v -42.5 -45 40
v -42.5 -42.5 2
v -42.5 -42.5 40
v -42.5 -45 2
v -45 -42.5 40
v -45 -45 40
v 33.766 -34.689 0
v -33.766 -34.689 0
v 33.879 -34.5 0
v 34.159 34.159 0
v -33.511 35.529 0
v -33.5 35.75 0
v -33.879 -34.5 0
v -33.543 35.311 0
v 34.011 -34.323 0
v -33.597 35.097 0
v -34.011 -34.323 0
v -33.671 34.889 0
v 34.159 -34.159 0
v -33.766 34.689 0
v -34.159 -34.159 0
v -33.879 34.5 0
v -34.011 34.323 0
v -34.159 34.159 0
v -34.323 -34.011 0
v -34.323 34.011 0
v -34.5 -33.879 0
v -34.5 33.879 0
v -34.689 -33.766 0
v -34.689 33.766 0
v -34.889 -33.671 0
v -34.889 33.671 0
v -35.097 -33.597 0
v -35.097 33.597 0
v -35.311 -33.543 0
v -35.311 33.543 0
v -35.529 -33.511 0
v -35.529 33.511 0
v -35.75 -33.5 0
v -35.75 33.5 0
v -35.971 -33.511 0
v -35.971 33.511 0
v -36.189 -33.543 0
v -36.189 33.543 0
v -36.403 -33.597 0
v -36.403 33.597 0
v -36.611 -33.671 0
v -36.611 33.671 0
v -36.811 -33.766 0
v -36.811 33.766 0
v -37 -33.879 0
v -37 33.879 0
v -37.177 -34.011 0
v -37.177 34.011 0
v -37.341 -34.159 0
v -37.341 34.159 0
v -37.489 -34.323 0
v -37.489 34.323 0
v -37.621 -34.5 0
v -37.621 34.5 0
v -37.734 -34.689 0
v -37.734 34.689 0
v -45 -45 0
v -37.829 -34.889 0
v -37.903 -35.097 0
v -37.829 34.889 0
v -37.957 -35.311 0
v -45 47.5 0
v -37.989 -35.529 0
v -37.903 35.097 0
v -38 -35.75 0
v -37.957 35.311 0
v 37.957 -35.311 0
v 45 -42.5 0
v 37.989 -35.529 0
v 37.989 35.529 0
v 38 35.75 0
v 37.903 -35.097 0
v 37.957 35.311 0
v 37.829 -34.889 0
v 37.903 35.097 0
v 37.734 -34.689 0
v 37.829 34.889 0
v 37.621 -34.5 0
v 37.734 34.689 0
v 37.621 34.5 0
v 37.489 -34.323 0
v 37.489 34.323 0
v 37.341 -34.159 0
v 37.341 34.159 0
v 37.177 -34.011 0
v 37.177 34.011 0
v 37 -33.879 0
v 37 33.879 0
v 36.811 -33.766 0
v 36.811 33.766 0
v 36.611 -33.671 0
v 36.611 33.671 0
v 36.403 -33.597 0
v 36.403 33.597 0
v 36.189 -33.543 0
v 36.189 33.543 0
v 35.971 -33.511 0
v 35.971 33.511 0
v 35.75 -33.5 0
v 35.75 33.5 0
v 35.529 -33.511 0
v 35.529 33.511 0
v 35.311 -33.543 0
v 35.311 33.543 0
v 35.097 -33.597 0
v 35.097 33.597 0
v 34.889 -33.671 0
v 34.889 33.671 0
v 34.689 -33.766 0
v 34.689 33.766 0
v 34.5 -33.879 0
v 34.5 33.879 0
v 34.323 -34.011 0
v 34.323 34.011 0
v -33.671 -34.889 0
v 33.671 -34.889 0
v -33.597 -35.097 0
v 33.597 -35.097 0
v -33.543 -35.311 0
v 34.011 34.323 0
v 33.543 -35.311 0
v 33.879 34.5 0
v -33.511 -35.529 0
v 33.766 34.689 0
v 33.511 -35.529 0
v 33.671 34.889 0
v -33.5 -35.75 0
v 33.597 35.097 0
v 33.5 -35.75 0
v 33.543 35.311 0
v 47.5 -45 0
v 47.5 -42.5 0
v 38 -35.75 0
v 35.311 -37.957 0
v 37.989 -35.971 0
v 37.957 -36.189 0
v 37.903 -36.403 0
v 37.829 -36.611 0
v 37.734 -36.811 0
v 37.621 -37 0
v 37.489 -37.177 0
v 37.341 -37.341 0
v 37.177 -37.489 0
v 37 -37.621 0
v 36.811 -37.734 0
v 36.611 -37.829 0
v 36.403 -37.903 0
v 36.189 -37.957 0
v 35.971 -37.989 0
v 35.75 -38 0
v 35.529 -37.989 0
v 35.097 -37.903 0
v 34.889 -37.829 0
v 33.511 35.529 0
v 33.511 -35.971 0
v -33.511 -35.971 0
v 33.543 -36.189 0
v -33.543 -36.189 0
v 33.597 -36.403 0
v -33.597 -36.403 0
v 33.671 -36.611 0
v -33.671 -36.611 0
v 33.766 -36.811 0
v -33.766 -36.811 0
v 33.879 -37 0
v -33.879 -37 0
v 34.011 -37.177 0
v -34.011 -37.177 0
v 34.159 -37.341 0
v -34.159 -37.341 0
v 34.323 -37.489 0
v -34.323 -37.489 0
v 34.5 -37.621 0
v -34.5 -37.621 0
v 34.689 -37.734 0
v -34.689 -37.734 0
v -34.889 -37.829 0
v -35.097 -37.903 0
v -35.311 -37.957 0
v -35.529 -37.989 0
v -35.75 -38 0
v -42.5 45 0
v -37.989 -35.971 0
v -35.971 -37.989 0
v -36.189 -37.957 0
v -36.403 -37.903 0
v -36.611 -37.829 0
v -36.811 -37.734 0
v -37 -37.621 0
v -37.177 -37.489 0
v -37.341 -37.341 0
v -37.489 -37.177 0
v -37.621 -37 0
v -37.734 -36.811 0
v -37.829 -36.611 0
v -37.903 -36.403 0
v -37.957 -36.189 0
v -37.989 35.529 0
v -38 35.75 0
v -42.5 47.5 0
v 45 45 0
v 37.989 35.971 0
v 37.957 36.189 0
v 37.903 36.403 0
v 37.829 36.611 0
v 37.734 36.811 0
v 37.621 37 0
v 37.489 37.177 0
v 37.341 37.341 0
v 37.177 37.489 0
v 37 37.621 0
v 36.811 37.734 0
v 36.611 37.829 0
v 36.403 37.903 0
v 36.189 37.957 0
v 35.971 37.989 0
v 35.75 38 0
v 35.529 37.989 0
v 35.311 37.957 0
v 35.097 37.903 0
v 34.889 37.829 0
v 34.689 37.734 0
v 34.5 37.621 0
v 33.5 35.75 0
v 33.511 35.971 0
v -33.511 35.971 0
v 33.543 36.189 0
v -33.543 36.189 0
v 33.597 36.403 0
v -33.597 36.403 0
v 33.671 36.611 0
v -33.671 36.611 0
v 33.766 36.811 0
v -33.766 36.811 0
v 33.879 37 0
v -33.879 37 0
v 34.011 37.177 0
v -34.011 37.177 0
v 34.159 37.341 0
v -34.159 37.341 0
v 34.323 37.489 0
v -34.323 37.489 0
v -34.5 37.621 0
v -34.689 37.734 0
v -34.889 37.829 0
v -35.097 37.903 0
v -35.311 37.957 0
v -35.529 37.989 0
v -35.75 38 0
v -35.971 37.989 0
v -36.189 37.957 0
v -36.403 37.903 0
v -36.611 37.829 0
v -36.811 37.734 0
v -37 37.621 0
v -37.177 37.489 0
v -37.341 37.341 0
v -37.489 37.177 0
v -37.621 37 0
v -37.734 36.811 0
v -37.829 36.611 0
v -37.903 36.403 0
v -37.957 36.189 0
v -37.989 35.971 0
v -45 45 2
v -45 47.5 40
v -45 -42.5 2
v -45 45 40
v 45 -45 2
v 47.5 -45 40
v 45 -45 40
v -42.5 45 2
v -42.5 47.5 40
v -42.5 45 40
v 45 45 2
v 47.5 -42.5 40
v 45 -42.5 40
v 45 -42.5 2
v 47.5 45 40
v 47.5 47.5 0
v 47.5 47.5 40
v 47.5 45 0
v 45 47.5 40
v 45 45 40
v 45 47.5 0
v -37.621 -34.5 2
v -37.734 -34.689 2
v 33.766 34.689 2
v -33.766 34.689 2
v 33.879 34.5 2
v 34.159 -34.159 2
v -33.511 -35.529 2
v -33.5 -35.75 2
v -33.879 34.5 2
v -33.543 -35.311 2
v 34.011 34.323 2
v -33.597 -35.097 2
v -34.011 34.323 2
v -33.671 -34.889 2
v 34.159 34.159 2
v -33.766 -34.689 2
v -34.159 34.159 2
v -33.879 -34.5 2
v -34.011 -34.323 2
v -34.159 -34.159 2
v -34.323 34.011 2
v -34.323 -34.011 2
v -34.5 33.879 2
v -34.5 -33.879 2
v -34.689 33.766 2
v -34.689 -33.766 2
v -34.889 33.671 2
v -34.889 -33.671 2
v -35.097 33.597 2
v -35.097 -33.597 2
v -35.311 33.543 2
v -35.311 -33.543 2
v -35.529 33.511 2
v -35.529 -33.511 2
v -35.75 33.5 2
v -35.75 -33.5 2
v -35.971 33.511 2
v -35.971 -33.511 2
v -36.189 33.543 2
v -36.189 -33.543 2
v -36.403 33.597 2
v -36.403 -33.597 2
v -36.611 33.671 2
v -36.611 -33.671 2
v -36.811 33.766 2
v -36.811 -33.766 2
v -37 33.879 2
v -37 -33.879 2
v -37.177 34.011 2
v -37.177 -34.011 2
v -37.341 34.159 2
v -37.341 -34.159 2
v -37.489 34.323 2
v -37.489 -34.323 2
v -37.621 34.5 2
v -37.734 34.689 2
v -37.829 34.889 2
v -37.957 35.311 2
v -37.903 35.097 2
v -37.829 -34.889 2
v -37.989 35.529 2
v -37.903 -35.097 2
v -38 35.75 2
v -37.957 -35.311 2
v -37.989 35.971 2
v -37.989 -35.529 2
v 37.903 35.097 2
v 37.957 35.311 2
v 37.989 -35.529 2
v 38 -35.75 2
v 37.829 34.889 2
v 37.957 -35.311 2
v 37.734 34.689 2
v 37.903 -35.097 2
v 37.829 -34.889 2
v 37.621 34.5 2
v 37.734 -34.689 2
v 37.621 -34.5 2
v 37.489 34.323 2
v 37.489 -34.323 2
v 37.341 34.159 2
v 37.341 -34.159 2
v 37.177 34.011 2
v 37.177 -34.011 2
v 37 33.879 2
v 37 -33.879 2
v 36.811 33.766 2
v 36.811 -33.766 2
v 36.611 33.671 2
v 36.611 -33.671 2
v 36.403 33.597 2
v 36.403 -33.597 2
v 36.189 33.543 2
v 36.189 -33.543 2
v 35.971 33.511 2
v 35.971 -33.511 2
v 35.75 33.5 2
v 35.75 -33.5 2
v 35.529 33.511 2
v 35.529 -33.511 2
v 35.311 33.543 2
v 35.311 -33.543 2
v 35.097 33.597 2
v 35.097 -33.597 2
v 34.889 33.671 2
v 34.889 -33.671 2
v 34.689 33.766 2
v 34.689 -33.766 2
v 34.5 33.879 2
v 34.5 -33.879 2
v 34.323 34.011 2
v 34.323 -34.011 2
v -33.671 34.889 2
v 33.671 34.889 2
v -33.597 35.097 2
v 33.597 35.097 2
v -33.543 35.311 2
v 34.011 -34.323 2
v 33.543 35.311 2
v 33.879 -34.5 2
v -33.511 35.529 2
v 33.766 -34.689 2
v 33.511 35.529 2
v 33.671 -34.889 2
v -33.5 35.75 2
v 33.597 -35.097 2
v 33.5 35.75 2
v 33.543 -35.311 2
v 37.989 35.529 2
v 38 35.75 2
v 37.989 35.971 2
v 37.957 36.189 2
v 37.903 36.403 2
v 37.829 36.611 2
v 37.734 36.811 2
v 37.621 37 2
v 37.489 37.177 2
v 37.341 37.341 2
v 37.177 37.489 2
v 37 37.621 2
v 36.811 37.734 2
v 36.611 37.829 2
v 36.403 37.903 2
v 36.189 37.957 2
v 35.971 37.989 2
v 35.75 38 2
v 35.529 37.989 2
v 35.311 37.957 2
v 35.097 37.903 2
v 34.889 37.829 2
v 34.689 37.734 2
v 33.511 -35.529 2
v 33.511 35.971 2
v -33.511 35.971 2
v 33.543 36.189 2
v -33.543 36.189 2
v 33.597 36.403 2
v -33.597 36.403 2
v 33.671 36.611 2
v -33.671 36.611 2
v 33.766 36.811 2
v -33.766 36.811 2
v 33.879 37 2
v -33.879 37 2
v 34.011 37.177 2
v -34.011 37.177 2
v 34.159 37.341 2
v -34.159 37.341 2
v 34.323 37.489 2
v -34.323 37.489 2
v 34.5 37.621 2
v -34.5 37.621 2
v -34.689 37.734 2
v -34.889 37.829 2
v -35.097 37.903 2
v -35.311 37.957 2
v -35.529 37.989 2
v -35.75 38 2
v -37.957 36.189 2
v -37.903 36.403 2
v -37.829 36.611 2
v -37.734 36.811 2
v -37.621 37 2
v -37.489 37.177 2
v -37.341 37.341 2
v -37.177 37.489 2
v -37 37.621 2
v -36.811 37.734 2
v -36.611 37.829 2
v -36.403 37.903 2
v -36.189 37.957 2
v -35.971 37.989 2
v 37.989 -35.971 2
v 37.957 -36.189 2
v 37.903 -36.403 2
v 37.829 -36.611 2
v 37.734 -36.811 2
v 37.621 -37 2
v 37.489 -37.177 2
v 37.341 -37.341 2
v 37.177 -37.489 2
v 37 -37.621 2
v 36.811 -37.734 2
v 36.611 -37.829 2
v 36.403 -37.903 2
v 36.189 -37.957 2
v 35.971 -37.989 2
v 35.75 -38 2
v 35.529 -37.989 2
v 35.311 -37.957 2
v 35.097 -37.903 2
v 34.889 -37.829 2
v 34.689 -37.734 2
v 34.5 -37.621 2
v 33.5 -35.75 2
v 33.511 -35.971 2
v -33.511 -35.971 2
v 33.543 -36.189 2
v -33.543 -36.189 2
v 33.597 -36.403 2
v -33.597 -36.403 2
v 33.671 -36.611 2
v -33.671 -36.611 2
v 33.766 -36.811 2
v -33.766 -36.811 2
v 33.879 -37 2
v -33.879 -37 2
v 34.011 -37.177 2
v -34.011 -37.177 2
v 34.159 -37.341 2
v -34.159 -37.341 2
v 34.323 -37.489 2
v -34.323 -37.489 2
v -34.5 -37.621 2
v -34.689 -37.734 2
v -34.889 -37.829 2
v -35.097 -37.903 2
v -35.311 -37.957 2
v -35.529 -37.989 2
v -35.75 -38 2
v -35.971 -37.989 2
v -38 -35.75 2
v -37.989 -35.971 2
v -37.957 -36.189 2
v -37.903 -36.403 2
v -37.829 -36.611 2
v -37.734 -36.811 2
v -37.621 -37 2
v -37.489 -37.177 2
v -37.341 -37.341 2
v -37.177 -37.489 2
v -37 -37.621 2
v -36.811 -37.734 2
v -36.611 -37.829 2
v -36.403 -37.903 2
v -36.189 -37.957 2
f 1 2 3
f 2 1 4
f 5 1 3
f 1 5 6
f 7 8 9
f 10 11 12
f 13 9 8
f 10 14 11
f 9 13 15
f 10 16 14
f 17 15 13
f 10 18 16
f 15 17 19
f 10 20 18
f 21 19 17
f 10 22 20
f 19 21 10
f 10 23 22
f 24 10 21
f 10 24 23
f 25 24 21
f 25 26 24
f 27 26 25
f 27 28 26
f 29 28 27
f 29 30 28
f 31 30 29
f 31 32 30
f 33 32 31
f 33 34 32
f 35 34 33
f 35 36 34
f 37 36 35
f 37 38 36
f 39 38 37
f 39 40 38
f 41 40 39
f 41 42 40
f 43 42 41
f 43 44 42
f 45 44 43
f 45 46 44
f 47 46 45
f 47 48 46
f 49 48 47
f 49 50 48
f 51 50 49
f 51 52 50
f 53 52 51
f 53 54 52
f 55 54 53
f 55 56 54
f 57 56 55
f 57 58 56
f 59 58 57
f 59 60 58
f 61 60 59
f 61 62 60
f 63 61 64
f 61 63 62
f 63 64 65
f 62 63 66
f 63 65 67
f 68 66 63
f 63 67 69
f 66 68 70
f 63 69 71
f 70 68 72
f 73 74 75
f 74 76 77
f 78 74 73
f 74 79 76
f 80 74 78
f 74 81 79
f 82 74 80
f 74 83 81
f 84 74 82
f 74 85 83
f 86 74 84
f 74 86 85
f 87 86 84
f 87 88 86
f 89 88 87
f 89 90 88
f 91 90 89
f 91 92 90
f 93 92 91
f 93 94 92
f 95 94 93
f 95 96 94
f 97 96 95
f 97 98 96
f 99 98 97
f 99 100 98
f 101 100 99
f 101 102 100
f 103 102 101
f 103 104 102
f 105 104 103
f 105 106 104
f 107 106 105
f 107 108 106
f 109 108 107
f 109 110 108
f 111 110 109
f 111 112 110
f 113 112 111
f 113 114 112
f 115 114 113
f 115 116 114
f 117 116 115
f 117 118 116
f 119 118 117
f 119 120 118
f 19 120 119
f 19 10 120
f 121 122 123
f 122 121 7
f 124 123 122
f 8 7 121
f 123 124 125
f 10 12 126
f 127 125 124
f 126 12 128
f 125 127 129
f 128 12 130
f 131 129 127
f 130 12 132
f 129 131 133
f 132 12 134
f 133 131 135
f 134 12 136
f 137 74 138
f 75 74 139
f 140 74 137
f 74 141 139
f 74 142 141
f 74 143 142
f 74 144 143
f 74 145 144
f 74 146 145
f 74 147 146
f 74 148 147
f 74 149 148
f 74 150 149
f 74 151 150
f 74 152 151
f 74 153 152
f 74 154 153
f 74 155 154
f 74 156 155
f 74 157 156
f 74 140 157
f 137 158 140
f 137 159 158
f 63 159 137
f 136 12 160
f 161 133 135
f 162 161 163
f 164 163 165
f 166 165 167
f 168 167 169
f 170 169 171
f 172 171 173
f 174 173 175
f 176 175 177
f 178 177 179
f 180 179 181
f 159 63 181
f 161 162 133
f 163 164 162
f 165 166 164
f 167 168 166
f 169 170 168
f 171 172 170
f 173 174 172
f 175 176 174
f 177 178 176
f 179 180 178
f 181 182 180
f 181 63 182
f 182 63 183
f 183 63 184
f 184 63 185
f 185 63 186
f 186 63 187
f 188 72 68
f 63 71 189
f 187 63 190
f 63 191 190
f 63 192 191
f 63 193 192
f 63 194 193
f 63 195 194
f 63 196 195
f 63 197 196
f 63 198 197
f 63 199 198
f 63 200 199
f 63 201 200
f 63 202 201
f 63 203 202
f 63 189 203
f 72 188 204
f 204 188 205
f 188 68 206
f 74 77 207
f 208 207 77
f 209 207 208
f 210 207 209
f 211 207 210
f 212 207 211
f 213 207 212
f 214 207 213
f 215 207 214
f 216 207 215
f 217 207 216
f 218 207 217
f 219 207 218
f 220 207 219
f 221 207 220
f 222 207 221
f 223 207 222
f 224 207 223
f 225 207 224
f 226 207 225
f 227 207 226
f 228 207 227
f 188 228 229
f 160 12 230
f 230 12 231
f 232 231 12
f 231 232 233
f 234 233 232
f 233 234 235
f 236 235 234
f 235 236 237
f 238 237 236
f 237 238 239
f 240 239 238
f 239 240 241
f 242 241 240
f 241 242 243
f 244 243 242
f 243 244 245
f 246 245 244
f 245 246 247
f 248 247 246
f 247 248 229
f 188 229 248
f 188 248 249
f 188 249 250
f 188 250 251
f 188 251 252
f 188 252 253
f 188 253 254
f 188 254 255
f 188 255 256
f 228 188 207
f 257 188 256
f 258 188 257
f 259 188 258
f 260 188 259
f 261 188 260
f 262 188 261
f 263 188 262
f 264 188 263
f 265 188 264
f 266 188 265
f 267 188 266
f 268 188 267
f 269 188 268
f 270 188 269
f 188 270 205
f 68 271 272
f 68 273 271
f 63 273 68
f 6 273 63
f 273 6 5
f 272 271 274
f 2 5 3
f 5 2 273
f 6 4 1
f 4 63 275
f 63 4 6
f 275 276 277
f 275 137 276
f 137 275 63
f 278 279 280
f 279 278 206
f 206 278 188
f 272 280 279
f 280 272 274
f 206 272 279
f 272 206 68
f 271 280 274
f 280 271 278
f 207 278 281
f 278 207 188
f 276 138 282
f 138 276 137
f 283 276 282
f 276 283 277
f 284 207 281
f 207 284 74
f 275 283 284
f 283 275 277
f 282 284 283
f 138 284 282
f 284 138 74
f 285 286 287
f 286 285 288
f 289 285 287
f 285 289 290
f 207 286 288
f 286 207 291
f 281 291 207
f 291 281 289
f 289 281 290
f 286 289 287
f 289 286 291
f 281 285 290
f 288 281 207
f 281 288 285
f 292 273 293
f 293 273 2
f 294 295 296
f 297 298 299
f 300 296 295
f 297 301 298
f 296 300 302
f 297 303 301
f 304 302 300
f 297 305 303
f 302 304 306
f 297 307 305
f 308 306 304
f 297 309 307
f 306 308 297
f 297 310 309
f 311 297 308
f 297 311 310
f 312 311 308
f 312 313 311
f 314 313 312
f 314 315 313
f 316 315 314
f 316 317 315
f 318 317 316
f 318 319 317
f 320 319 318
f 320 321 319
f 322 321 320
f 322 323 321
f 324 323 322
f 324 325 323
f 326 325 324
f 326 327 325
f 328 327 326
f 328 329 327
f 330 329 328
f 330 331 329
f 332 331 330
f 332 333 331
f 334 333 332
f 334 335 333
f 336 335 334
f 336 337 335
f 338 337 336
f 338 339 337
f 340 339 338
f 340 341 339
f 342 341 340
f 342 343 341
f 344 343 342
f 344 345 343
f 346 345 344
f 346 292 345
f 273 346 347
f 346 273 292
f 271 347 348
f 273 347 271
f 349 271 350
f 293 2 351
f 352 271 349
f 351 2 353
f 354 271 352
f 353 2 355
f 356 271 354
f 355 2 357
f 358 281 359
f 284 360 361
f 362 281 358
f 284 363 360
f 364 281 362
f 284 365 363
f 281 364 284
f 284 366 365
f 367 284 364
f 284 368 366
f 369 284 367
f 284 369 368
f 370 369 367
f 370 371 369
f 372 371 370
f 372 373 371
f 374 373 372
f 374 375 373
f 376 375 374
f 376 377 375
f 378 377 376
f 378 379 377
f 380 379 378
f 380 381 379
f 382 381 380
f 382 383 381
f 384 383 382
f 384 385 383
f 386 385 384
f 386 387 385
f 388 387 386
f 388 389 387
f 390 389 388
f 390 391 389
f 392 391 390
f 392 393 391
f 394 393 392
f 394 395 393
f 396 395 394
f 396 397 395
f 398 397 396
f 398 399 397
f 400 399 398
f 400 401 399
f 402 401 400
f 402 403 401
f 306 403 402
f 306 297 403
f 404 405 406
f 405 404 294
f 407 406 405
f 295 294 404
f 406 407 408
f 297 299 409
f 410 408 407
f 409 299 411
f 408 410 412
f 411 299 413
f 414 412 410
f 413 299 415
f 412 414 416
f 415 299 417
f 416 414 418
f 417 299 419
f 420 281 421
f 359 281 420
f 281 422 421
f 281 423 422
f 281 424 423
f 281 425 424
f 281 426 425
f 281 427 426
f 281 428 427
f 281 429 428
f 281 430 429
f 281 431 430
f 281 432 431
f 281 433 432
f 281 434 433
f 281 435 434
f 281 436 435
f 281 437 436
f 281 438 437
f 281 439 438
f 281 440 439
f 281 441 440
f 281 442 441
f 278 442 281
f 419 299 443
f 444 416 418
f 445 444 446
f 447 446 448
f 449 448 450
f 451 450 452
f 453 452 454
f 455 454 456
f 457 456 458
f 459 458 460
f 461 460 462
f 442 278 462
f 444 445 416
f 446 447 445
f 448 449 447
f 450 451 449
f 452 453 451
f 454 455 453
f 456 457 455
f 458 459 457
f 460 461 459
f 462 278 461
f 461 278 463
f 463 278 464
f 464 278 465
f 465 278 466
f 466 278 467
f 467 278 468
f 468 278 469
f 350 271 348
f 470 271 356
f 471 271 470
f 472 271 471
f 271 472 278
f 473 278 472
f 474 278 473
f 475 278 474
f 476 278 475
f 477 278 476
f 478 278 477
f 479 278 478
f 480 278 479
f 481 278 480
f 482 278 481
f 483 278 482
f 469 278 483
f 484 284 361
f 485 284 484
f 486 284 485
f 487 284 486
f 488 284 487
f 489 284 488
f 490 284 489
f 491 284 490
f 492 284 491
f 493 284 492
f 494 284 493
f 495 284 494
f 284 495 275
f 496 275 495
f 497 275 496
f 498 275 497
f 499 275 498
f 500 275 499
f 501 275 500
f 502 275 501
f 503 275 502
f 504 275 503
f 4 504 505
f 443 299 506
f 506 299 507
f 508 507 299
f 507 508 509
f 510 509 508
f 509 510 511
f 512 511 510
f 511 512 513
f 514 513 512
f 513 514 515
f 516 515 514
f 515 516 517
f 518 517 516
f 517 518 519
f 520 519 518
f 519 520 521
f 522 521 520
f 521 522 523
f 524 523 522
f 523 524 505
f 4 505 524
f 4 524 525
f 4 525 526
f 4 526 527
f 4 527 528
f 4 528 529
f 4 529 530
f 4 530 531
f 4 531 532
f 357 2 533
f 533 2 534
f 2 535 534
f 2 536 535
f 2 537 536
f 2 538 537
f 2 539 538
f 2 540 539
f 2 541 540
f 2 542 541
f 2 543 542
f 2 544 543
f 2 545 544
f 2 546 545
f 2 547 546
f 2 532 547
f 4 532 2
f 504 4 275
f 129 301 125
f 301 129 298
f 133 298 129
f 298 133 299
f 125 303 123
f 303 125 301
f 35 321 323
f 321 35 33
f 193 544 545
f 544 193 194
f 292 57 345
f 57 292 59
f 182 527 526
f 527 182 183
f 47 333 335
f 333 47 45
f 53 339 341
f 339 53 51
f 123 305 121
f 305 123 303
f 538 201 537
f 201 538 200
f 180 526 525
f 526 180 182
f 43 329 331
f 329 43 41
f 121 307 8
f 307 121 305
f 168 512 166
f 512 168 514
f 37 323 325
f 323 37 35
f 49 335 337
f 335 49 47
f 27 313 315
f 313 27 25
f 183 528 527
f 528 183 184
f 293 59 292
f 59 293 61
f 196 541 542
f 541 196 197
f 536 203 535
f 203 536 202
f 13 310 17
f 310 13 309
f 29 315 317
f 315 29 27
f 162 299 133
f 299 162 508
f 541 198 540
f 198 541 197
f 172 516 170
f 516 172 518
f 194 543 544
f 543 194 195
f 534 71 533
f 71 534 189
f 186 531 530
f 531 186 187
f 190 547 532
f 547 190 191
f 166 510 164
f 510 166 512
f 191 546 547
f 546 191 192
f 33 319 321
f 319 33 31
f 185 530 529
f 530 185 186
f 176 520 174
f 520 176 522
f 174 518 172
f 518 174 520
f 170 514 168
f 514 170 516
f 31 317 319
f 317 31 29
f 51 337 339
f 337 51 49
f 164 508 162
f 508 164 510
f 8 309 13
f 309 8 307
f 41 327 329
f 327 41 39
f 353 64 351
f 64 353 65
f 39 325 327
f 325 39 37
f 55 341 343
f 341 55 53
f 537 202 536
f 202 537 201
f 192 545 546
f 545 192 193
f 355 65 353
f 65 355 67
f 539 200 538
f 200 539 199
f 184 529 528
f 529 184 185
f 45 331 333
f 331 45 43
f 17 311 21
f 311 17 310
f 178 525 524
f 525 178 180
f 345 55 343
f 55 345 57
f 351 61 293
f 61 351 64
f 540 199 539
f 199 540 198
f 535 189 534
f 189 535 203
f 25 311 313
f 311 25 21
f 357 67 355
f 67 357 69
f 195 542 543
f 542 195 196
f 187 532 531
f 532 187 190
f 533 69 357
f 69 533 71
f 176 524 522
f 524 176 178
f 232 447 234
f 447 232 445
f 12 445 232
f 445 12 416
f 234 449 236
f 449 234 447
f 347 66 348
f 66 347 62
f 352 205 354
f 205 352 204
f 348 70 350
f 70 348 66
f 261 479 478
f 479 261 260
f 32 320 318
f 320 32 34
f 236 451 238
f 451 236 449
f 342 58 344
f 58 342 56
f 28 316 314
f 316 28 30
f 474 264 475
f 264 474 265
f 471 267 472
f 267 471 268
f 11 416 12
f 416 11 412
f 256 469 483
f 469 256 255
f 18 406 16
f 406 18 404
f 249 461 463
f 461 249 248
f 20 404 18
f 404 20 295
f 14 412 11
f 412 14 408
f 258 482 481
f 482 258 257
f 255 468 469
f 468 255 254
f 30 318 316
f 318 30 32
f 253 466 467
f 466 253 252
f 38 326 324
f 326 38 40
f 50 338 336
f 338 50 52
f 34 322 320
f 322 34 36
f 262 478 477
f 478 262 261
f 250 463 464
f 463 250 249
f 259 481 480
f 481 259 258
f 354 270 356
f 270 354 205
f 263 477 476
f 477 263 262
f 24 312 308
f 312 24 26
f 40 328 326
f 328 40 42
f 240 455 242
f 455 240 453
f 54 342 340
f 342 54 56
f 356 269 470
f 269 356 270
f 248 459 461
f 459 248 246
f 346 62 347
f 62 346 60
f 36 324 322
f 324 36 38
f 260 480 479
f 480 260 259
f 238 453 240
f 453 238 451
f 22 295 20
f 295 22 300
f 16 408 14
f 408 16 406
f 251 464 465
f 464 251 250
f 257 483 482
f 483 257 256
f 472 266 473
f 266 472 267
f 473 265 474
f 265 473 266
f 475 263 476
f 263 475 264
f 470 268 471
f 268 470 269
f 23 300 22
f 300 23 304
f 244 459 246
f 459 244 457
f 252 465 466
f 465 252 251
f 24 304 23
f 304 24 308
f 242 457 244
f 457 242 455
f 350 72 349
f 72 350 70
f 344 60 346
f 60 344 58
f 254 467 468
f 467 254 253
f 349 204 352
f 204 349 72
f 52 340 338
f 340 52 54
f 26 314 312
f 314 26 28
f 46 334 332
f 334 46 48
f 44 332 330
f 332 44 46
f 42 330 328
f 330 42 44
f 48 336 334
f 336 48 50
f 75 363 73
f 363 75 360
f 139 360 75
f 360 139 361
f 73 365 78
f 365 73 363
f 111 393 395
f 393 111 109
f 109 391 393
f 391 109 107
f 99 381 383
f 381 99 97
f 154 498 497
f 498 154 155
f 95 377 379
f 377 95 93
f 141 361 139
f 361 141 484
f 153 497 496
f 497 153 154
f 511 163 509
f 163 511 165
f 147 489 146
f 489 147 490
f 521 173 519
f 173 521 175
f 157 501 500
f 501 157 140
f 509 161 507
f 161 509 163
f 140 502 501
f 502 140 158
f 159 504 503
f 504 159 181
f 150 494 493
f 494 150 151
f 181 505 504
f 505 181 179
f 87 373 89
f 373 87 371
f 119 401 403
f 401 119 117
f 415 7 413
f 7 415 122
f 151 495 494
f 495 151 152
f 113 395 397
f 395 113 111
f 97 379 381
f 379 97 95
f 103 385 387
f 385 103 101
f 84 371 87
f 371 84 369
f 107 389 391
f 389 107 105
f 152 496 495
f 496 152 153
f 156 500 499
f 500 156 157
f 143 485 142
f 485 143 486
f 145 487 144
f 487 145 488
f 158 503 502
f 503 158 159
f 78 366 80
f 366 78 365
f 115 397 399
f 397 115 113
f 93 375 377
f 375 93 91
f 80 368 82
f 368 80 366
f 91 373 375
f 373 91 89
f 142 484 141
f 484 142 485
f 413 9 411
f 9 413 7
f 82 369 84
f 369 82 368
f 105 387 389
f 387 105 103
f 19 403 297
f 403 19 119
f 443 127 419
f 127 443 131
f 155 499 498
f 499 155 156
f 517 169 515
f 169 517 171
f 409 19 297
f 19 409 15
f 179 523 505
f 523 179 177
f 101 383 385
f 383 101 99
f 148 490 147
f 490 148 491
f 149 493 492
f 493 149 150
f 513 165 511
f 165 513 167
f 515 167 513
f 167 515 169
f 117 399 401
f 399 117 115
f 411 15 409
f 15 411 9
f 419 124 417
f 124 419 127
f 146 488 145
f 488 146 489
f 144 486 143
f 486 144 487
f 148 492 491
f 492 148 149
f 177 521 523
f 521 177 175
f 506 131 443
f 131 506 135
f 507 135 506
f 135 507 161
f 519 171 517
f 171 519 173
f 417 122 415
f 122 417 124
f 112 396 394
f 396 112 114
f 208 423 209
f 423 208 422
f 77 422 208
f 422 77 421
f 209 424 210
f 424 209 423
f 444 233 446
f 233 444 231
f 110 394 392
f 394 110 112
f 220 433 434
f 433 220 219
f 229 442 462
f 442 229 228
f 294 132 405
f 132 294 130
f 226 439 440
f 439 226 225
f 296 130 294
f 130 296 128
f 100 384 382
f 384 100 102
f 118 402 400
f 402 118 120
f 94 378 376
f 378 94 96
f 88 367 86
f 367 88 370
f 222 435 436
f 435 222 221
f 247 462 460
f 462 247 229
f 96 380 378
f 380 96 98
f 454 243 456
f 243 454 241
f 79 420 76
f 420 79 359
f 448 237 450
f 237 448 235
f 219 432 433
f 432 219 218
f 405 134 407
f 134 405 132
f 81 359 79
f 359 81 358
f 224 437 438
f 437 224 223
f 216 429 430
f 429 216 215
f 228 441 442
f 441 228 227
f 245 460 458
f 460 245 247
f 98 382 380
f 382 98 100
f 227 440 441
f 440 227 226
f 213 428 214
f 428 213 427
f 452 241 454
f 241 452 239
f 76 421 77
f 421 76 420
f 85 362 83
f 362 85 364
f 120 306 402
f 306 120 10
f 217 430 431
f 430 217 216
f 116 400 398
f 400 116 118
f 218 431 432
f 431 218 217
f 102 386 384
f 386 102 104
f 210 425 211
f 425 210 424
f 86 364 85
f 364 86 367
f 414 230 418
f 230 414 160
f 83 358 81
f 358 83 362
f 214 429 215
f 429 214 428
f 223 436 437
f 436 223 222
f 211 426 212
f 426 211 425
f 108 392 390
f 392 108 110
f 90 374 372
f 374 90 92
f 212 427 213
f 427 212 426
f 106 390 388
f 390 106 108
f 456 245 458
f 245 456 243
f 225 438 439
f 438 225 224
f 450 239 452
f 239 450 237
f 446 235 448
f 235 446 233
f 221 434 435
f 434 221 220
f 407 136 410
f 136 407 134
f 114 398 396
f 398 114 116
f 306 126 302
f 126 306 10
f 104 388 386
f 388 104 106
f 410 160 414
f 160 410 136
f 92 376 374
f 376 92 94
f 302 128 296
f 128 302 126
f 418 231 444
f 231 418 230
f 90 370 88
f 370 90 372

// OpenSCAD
// Magnetic stirrer housing (print orientation: upside down)
// Units: mm

// ---- Dimensions ----
top_thickness     = 2;    // top plate thickness (z = 0 to 2)
wall_thickness    = 2.5;  // wall thickness
box_height        = 40;   // total height of walls (z = 0 to 40)
outer_size        = 90;   // outer size in X and Y
hole_size         = 4.5;  // M4 screw hole diameter
hole_pattern      = 71.5; // square pitch of screw holes
notch_width       = 12;   // cable notch width
notch_depth       = 8;    // cable notch depth from open edge (z = 32 to 40)
overcut           = 0.5;  // extra length for cutting shapes

$fn = 64;

// ---- Model ----
difference() {
    union() {
        // Top plate
        translate([-outer_size/2, -outer_size/2, 0])
            cube([outer_size, outer_size, top_thickness]);

        // Walls, open at the top
        for (x = [-outer_size/2, outer_size/2])
            for (y = [-outer_size/2, outer_size/2])
                translate([x, y, 0])
                    cube([wall_thickness, wall_thickness, box_height]);
    }

    // Screw holes through the top plate
    for (dx = [-hole_pattern/2, hole_pattern/2])
        for (dy = [-hole_pattern/2, hole_pattern/2])
            translate([dx, dy, -overcut])
                cylinder(d = hole_size, h = top_thickness + 2*overcut);

    // Cable notch in one wall (x = -45, centred along the wall)
    translate([-outer_size/2, -wall_thickness/2, box_height - notch_depth])
        cube([notch_width, wall_thickness + overcut, notch_depth + overcut]);
}
